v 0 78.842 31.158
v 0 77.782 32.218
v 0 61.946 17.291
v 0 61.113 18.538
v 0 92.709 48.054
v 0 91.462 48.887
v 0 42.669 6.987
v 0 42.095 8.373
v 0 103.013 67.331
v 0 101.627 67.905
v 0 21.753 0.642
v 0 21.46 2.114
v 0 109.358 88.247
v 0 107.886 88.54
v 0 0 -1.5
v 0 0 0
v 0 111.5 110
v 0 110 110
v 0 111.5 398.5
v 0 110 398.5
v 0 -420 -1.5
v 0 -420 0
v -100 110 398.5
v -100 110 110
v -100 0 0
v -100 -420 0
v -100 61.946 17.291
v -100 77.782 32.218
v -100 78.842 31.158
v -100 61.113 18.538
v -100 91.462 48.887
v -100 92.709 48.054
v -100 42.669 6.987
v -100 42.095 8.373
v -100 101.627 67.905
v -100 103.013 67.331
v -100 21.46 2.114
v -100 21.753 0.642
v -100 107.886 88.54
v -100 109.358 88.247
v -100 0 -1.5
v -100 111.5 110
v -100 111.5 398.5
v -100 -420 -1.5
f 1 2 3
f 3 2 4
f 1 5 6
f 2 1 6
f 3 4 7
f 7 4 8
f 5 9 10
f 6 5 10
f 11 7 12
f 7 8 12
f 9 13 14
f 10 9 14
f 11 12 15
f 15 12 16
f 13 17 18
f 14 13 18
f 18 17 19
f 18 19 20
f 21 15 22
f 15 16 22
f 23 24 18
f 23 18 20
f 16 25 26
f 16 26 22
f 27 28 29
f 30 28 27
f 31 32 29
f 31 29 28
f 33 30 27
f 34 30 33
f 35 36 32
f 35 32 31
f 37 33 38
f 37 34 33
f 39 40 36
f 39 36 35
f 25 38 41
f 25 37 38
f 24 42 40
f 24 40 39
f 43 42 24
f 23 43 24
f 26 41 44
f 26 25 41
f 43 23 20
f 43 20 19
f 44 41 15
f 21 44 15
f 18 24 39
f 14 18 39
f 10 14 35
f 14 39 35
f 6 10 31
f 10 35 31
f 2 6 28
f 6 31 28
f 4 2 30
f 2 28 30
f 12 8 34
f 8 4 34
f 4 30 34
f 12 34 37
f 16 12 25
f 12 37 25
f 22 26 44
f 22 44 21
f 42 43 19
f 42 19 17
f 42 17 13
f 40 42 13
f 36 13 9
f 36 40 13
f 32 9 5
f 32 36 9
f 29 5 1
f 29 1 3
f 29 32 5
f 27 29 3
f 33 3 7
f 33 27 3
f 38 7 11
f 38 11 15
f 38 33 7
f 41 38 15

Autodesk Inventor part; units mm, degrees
ref_plane "YZ Plane" through (0, 0, 0) normal (1, 0, 0) x (0, 1, 0)
ref_plane "XZ Plane" through (0, 0, 0) normal (0, 1, 0) x (-1, 0, 0)
ref_plane "XY Plane" through (0, 0, 0) normal (0, 0, 1) x (1, 0, 0)
ref_plane "Work Plane1" through (0, 0, 0) normal (0, 0, 1) x (1, 0, 0)
ref_plane "Work Plane2" through (0, 110, 380) normal (0, -1, 0) x (-1, 0, 0)
sketch "Sketch1" plane through (0, 0, 0) normal (0, 0, 1) x (1, 0, 0)
  line L0 (0, 0) -> (0, -840)
  line L1 (0, 0) -> (-100, 0)
  line L2 (-100, 0) -> (-100, -140)
  line L3 (-10, -140) -> (-100, -140)
  line L4 (-10, -140) -> (-10, -700)
  line L5 (-10, -700) -> (-100, -700)
  line L6 (-100, -700) -> (-100, -840)
  line L7 (0, -840) -> (-100, -840)
  line L8 (-100, -140) -> (-100, -700)
  line L9 (-100, -420) -> (0, -420)
extrude "Plate1" add sketch "Sketch1" against normal blind 1.5 contours L0 L9 L4 L3 L2 L1 | L9 L8 L3 L4
ref_plane "Work Plane3" through (0, 111.5, 380) normal (0, -1, 0) x (-1, 0, 0)
sketch "Sketch2" plane through (0, 111.5, 380) normal (0, -1, 0) x (-1, 0, 0)
  line L0 (0, 380) -> (100, 380)
  line L1 (100, 380) -> (100, -18.5)
  line L2 (100, -18.5) -> (0, -18.5)
  line L3 (0, -18.5) -> (0, 380)
edge flange "Flange1" height 400 angle 90 thickness 1.5 bend radius 110 thickness toward (0, -1, 0) relief tear relief width 1.5 relief depth 0.75 edges at (-50, 0, 0) wall of the first edge with corners at (0, 111.5, 0) (-100, 111.5, 0) (-100, 111.5, 398.5) (0, 111.5, 398.5)
bend "Bend1"
corner "Corner1"
equation "\"d0\" = Thickness"
equation "\"d2\" = BendReliefWidth"
equation "\"d3\" = BendReliefDepth"
equation "\"d4\" = MinimumRemnant"
equation "\"d5\" = TransitionRadius"
equation "\"d9\" = CornerReliefSize"
equation "\"d10\" = GapSize"
equation "\"d11\" = JacobiRadiusSize"
equation "\"BendRadius\" = Thickness"
equation "\"BendReliefWidth\" = Thickness"
equation "\"BendReliefDepth\" = 0.5 * Thickness"
equation "\"CornerReliefSize\" = 4 * Thickness"
equation "\"MinimumRemnant\" = 2 * Thickness"
equation "\"TransitionRadius\" = BendRadius"
equation "\"JacobiRadiusSize\" = BendRadius"
equation "\"GapSize\" = Thickness"
equation "\"Thickness\" = 1.5"
properties part number "CARCASA_ALUM_9"
